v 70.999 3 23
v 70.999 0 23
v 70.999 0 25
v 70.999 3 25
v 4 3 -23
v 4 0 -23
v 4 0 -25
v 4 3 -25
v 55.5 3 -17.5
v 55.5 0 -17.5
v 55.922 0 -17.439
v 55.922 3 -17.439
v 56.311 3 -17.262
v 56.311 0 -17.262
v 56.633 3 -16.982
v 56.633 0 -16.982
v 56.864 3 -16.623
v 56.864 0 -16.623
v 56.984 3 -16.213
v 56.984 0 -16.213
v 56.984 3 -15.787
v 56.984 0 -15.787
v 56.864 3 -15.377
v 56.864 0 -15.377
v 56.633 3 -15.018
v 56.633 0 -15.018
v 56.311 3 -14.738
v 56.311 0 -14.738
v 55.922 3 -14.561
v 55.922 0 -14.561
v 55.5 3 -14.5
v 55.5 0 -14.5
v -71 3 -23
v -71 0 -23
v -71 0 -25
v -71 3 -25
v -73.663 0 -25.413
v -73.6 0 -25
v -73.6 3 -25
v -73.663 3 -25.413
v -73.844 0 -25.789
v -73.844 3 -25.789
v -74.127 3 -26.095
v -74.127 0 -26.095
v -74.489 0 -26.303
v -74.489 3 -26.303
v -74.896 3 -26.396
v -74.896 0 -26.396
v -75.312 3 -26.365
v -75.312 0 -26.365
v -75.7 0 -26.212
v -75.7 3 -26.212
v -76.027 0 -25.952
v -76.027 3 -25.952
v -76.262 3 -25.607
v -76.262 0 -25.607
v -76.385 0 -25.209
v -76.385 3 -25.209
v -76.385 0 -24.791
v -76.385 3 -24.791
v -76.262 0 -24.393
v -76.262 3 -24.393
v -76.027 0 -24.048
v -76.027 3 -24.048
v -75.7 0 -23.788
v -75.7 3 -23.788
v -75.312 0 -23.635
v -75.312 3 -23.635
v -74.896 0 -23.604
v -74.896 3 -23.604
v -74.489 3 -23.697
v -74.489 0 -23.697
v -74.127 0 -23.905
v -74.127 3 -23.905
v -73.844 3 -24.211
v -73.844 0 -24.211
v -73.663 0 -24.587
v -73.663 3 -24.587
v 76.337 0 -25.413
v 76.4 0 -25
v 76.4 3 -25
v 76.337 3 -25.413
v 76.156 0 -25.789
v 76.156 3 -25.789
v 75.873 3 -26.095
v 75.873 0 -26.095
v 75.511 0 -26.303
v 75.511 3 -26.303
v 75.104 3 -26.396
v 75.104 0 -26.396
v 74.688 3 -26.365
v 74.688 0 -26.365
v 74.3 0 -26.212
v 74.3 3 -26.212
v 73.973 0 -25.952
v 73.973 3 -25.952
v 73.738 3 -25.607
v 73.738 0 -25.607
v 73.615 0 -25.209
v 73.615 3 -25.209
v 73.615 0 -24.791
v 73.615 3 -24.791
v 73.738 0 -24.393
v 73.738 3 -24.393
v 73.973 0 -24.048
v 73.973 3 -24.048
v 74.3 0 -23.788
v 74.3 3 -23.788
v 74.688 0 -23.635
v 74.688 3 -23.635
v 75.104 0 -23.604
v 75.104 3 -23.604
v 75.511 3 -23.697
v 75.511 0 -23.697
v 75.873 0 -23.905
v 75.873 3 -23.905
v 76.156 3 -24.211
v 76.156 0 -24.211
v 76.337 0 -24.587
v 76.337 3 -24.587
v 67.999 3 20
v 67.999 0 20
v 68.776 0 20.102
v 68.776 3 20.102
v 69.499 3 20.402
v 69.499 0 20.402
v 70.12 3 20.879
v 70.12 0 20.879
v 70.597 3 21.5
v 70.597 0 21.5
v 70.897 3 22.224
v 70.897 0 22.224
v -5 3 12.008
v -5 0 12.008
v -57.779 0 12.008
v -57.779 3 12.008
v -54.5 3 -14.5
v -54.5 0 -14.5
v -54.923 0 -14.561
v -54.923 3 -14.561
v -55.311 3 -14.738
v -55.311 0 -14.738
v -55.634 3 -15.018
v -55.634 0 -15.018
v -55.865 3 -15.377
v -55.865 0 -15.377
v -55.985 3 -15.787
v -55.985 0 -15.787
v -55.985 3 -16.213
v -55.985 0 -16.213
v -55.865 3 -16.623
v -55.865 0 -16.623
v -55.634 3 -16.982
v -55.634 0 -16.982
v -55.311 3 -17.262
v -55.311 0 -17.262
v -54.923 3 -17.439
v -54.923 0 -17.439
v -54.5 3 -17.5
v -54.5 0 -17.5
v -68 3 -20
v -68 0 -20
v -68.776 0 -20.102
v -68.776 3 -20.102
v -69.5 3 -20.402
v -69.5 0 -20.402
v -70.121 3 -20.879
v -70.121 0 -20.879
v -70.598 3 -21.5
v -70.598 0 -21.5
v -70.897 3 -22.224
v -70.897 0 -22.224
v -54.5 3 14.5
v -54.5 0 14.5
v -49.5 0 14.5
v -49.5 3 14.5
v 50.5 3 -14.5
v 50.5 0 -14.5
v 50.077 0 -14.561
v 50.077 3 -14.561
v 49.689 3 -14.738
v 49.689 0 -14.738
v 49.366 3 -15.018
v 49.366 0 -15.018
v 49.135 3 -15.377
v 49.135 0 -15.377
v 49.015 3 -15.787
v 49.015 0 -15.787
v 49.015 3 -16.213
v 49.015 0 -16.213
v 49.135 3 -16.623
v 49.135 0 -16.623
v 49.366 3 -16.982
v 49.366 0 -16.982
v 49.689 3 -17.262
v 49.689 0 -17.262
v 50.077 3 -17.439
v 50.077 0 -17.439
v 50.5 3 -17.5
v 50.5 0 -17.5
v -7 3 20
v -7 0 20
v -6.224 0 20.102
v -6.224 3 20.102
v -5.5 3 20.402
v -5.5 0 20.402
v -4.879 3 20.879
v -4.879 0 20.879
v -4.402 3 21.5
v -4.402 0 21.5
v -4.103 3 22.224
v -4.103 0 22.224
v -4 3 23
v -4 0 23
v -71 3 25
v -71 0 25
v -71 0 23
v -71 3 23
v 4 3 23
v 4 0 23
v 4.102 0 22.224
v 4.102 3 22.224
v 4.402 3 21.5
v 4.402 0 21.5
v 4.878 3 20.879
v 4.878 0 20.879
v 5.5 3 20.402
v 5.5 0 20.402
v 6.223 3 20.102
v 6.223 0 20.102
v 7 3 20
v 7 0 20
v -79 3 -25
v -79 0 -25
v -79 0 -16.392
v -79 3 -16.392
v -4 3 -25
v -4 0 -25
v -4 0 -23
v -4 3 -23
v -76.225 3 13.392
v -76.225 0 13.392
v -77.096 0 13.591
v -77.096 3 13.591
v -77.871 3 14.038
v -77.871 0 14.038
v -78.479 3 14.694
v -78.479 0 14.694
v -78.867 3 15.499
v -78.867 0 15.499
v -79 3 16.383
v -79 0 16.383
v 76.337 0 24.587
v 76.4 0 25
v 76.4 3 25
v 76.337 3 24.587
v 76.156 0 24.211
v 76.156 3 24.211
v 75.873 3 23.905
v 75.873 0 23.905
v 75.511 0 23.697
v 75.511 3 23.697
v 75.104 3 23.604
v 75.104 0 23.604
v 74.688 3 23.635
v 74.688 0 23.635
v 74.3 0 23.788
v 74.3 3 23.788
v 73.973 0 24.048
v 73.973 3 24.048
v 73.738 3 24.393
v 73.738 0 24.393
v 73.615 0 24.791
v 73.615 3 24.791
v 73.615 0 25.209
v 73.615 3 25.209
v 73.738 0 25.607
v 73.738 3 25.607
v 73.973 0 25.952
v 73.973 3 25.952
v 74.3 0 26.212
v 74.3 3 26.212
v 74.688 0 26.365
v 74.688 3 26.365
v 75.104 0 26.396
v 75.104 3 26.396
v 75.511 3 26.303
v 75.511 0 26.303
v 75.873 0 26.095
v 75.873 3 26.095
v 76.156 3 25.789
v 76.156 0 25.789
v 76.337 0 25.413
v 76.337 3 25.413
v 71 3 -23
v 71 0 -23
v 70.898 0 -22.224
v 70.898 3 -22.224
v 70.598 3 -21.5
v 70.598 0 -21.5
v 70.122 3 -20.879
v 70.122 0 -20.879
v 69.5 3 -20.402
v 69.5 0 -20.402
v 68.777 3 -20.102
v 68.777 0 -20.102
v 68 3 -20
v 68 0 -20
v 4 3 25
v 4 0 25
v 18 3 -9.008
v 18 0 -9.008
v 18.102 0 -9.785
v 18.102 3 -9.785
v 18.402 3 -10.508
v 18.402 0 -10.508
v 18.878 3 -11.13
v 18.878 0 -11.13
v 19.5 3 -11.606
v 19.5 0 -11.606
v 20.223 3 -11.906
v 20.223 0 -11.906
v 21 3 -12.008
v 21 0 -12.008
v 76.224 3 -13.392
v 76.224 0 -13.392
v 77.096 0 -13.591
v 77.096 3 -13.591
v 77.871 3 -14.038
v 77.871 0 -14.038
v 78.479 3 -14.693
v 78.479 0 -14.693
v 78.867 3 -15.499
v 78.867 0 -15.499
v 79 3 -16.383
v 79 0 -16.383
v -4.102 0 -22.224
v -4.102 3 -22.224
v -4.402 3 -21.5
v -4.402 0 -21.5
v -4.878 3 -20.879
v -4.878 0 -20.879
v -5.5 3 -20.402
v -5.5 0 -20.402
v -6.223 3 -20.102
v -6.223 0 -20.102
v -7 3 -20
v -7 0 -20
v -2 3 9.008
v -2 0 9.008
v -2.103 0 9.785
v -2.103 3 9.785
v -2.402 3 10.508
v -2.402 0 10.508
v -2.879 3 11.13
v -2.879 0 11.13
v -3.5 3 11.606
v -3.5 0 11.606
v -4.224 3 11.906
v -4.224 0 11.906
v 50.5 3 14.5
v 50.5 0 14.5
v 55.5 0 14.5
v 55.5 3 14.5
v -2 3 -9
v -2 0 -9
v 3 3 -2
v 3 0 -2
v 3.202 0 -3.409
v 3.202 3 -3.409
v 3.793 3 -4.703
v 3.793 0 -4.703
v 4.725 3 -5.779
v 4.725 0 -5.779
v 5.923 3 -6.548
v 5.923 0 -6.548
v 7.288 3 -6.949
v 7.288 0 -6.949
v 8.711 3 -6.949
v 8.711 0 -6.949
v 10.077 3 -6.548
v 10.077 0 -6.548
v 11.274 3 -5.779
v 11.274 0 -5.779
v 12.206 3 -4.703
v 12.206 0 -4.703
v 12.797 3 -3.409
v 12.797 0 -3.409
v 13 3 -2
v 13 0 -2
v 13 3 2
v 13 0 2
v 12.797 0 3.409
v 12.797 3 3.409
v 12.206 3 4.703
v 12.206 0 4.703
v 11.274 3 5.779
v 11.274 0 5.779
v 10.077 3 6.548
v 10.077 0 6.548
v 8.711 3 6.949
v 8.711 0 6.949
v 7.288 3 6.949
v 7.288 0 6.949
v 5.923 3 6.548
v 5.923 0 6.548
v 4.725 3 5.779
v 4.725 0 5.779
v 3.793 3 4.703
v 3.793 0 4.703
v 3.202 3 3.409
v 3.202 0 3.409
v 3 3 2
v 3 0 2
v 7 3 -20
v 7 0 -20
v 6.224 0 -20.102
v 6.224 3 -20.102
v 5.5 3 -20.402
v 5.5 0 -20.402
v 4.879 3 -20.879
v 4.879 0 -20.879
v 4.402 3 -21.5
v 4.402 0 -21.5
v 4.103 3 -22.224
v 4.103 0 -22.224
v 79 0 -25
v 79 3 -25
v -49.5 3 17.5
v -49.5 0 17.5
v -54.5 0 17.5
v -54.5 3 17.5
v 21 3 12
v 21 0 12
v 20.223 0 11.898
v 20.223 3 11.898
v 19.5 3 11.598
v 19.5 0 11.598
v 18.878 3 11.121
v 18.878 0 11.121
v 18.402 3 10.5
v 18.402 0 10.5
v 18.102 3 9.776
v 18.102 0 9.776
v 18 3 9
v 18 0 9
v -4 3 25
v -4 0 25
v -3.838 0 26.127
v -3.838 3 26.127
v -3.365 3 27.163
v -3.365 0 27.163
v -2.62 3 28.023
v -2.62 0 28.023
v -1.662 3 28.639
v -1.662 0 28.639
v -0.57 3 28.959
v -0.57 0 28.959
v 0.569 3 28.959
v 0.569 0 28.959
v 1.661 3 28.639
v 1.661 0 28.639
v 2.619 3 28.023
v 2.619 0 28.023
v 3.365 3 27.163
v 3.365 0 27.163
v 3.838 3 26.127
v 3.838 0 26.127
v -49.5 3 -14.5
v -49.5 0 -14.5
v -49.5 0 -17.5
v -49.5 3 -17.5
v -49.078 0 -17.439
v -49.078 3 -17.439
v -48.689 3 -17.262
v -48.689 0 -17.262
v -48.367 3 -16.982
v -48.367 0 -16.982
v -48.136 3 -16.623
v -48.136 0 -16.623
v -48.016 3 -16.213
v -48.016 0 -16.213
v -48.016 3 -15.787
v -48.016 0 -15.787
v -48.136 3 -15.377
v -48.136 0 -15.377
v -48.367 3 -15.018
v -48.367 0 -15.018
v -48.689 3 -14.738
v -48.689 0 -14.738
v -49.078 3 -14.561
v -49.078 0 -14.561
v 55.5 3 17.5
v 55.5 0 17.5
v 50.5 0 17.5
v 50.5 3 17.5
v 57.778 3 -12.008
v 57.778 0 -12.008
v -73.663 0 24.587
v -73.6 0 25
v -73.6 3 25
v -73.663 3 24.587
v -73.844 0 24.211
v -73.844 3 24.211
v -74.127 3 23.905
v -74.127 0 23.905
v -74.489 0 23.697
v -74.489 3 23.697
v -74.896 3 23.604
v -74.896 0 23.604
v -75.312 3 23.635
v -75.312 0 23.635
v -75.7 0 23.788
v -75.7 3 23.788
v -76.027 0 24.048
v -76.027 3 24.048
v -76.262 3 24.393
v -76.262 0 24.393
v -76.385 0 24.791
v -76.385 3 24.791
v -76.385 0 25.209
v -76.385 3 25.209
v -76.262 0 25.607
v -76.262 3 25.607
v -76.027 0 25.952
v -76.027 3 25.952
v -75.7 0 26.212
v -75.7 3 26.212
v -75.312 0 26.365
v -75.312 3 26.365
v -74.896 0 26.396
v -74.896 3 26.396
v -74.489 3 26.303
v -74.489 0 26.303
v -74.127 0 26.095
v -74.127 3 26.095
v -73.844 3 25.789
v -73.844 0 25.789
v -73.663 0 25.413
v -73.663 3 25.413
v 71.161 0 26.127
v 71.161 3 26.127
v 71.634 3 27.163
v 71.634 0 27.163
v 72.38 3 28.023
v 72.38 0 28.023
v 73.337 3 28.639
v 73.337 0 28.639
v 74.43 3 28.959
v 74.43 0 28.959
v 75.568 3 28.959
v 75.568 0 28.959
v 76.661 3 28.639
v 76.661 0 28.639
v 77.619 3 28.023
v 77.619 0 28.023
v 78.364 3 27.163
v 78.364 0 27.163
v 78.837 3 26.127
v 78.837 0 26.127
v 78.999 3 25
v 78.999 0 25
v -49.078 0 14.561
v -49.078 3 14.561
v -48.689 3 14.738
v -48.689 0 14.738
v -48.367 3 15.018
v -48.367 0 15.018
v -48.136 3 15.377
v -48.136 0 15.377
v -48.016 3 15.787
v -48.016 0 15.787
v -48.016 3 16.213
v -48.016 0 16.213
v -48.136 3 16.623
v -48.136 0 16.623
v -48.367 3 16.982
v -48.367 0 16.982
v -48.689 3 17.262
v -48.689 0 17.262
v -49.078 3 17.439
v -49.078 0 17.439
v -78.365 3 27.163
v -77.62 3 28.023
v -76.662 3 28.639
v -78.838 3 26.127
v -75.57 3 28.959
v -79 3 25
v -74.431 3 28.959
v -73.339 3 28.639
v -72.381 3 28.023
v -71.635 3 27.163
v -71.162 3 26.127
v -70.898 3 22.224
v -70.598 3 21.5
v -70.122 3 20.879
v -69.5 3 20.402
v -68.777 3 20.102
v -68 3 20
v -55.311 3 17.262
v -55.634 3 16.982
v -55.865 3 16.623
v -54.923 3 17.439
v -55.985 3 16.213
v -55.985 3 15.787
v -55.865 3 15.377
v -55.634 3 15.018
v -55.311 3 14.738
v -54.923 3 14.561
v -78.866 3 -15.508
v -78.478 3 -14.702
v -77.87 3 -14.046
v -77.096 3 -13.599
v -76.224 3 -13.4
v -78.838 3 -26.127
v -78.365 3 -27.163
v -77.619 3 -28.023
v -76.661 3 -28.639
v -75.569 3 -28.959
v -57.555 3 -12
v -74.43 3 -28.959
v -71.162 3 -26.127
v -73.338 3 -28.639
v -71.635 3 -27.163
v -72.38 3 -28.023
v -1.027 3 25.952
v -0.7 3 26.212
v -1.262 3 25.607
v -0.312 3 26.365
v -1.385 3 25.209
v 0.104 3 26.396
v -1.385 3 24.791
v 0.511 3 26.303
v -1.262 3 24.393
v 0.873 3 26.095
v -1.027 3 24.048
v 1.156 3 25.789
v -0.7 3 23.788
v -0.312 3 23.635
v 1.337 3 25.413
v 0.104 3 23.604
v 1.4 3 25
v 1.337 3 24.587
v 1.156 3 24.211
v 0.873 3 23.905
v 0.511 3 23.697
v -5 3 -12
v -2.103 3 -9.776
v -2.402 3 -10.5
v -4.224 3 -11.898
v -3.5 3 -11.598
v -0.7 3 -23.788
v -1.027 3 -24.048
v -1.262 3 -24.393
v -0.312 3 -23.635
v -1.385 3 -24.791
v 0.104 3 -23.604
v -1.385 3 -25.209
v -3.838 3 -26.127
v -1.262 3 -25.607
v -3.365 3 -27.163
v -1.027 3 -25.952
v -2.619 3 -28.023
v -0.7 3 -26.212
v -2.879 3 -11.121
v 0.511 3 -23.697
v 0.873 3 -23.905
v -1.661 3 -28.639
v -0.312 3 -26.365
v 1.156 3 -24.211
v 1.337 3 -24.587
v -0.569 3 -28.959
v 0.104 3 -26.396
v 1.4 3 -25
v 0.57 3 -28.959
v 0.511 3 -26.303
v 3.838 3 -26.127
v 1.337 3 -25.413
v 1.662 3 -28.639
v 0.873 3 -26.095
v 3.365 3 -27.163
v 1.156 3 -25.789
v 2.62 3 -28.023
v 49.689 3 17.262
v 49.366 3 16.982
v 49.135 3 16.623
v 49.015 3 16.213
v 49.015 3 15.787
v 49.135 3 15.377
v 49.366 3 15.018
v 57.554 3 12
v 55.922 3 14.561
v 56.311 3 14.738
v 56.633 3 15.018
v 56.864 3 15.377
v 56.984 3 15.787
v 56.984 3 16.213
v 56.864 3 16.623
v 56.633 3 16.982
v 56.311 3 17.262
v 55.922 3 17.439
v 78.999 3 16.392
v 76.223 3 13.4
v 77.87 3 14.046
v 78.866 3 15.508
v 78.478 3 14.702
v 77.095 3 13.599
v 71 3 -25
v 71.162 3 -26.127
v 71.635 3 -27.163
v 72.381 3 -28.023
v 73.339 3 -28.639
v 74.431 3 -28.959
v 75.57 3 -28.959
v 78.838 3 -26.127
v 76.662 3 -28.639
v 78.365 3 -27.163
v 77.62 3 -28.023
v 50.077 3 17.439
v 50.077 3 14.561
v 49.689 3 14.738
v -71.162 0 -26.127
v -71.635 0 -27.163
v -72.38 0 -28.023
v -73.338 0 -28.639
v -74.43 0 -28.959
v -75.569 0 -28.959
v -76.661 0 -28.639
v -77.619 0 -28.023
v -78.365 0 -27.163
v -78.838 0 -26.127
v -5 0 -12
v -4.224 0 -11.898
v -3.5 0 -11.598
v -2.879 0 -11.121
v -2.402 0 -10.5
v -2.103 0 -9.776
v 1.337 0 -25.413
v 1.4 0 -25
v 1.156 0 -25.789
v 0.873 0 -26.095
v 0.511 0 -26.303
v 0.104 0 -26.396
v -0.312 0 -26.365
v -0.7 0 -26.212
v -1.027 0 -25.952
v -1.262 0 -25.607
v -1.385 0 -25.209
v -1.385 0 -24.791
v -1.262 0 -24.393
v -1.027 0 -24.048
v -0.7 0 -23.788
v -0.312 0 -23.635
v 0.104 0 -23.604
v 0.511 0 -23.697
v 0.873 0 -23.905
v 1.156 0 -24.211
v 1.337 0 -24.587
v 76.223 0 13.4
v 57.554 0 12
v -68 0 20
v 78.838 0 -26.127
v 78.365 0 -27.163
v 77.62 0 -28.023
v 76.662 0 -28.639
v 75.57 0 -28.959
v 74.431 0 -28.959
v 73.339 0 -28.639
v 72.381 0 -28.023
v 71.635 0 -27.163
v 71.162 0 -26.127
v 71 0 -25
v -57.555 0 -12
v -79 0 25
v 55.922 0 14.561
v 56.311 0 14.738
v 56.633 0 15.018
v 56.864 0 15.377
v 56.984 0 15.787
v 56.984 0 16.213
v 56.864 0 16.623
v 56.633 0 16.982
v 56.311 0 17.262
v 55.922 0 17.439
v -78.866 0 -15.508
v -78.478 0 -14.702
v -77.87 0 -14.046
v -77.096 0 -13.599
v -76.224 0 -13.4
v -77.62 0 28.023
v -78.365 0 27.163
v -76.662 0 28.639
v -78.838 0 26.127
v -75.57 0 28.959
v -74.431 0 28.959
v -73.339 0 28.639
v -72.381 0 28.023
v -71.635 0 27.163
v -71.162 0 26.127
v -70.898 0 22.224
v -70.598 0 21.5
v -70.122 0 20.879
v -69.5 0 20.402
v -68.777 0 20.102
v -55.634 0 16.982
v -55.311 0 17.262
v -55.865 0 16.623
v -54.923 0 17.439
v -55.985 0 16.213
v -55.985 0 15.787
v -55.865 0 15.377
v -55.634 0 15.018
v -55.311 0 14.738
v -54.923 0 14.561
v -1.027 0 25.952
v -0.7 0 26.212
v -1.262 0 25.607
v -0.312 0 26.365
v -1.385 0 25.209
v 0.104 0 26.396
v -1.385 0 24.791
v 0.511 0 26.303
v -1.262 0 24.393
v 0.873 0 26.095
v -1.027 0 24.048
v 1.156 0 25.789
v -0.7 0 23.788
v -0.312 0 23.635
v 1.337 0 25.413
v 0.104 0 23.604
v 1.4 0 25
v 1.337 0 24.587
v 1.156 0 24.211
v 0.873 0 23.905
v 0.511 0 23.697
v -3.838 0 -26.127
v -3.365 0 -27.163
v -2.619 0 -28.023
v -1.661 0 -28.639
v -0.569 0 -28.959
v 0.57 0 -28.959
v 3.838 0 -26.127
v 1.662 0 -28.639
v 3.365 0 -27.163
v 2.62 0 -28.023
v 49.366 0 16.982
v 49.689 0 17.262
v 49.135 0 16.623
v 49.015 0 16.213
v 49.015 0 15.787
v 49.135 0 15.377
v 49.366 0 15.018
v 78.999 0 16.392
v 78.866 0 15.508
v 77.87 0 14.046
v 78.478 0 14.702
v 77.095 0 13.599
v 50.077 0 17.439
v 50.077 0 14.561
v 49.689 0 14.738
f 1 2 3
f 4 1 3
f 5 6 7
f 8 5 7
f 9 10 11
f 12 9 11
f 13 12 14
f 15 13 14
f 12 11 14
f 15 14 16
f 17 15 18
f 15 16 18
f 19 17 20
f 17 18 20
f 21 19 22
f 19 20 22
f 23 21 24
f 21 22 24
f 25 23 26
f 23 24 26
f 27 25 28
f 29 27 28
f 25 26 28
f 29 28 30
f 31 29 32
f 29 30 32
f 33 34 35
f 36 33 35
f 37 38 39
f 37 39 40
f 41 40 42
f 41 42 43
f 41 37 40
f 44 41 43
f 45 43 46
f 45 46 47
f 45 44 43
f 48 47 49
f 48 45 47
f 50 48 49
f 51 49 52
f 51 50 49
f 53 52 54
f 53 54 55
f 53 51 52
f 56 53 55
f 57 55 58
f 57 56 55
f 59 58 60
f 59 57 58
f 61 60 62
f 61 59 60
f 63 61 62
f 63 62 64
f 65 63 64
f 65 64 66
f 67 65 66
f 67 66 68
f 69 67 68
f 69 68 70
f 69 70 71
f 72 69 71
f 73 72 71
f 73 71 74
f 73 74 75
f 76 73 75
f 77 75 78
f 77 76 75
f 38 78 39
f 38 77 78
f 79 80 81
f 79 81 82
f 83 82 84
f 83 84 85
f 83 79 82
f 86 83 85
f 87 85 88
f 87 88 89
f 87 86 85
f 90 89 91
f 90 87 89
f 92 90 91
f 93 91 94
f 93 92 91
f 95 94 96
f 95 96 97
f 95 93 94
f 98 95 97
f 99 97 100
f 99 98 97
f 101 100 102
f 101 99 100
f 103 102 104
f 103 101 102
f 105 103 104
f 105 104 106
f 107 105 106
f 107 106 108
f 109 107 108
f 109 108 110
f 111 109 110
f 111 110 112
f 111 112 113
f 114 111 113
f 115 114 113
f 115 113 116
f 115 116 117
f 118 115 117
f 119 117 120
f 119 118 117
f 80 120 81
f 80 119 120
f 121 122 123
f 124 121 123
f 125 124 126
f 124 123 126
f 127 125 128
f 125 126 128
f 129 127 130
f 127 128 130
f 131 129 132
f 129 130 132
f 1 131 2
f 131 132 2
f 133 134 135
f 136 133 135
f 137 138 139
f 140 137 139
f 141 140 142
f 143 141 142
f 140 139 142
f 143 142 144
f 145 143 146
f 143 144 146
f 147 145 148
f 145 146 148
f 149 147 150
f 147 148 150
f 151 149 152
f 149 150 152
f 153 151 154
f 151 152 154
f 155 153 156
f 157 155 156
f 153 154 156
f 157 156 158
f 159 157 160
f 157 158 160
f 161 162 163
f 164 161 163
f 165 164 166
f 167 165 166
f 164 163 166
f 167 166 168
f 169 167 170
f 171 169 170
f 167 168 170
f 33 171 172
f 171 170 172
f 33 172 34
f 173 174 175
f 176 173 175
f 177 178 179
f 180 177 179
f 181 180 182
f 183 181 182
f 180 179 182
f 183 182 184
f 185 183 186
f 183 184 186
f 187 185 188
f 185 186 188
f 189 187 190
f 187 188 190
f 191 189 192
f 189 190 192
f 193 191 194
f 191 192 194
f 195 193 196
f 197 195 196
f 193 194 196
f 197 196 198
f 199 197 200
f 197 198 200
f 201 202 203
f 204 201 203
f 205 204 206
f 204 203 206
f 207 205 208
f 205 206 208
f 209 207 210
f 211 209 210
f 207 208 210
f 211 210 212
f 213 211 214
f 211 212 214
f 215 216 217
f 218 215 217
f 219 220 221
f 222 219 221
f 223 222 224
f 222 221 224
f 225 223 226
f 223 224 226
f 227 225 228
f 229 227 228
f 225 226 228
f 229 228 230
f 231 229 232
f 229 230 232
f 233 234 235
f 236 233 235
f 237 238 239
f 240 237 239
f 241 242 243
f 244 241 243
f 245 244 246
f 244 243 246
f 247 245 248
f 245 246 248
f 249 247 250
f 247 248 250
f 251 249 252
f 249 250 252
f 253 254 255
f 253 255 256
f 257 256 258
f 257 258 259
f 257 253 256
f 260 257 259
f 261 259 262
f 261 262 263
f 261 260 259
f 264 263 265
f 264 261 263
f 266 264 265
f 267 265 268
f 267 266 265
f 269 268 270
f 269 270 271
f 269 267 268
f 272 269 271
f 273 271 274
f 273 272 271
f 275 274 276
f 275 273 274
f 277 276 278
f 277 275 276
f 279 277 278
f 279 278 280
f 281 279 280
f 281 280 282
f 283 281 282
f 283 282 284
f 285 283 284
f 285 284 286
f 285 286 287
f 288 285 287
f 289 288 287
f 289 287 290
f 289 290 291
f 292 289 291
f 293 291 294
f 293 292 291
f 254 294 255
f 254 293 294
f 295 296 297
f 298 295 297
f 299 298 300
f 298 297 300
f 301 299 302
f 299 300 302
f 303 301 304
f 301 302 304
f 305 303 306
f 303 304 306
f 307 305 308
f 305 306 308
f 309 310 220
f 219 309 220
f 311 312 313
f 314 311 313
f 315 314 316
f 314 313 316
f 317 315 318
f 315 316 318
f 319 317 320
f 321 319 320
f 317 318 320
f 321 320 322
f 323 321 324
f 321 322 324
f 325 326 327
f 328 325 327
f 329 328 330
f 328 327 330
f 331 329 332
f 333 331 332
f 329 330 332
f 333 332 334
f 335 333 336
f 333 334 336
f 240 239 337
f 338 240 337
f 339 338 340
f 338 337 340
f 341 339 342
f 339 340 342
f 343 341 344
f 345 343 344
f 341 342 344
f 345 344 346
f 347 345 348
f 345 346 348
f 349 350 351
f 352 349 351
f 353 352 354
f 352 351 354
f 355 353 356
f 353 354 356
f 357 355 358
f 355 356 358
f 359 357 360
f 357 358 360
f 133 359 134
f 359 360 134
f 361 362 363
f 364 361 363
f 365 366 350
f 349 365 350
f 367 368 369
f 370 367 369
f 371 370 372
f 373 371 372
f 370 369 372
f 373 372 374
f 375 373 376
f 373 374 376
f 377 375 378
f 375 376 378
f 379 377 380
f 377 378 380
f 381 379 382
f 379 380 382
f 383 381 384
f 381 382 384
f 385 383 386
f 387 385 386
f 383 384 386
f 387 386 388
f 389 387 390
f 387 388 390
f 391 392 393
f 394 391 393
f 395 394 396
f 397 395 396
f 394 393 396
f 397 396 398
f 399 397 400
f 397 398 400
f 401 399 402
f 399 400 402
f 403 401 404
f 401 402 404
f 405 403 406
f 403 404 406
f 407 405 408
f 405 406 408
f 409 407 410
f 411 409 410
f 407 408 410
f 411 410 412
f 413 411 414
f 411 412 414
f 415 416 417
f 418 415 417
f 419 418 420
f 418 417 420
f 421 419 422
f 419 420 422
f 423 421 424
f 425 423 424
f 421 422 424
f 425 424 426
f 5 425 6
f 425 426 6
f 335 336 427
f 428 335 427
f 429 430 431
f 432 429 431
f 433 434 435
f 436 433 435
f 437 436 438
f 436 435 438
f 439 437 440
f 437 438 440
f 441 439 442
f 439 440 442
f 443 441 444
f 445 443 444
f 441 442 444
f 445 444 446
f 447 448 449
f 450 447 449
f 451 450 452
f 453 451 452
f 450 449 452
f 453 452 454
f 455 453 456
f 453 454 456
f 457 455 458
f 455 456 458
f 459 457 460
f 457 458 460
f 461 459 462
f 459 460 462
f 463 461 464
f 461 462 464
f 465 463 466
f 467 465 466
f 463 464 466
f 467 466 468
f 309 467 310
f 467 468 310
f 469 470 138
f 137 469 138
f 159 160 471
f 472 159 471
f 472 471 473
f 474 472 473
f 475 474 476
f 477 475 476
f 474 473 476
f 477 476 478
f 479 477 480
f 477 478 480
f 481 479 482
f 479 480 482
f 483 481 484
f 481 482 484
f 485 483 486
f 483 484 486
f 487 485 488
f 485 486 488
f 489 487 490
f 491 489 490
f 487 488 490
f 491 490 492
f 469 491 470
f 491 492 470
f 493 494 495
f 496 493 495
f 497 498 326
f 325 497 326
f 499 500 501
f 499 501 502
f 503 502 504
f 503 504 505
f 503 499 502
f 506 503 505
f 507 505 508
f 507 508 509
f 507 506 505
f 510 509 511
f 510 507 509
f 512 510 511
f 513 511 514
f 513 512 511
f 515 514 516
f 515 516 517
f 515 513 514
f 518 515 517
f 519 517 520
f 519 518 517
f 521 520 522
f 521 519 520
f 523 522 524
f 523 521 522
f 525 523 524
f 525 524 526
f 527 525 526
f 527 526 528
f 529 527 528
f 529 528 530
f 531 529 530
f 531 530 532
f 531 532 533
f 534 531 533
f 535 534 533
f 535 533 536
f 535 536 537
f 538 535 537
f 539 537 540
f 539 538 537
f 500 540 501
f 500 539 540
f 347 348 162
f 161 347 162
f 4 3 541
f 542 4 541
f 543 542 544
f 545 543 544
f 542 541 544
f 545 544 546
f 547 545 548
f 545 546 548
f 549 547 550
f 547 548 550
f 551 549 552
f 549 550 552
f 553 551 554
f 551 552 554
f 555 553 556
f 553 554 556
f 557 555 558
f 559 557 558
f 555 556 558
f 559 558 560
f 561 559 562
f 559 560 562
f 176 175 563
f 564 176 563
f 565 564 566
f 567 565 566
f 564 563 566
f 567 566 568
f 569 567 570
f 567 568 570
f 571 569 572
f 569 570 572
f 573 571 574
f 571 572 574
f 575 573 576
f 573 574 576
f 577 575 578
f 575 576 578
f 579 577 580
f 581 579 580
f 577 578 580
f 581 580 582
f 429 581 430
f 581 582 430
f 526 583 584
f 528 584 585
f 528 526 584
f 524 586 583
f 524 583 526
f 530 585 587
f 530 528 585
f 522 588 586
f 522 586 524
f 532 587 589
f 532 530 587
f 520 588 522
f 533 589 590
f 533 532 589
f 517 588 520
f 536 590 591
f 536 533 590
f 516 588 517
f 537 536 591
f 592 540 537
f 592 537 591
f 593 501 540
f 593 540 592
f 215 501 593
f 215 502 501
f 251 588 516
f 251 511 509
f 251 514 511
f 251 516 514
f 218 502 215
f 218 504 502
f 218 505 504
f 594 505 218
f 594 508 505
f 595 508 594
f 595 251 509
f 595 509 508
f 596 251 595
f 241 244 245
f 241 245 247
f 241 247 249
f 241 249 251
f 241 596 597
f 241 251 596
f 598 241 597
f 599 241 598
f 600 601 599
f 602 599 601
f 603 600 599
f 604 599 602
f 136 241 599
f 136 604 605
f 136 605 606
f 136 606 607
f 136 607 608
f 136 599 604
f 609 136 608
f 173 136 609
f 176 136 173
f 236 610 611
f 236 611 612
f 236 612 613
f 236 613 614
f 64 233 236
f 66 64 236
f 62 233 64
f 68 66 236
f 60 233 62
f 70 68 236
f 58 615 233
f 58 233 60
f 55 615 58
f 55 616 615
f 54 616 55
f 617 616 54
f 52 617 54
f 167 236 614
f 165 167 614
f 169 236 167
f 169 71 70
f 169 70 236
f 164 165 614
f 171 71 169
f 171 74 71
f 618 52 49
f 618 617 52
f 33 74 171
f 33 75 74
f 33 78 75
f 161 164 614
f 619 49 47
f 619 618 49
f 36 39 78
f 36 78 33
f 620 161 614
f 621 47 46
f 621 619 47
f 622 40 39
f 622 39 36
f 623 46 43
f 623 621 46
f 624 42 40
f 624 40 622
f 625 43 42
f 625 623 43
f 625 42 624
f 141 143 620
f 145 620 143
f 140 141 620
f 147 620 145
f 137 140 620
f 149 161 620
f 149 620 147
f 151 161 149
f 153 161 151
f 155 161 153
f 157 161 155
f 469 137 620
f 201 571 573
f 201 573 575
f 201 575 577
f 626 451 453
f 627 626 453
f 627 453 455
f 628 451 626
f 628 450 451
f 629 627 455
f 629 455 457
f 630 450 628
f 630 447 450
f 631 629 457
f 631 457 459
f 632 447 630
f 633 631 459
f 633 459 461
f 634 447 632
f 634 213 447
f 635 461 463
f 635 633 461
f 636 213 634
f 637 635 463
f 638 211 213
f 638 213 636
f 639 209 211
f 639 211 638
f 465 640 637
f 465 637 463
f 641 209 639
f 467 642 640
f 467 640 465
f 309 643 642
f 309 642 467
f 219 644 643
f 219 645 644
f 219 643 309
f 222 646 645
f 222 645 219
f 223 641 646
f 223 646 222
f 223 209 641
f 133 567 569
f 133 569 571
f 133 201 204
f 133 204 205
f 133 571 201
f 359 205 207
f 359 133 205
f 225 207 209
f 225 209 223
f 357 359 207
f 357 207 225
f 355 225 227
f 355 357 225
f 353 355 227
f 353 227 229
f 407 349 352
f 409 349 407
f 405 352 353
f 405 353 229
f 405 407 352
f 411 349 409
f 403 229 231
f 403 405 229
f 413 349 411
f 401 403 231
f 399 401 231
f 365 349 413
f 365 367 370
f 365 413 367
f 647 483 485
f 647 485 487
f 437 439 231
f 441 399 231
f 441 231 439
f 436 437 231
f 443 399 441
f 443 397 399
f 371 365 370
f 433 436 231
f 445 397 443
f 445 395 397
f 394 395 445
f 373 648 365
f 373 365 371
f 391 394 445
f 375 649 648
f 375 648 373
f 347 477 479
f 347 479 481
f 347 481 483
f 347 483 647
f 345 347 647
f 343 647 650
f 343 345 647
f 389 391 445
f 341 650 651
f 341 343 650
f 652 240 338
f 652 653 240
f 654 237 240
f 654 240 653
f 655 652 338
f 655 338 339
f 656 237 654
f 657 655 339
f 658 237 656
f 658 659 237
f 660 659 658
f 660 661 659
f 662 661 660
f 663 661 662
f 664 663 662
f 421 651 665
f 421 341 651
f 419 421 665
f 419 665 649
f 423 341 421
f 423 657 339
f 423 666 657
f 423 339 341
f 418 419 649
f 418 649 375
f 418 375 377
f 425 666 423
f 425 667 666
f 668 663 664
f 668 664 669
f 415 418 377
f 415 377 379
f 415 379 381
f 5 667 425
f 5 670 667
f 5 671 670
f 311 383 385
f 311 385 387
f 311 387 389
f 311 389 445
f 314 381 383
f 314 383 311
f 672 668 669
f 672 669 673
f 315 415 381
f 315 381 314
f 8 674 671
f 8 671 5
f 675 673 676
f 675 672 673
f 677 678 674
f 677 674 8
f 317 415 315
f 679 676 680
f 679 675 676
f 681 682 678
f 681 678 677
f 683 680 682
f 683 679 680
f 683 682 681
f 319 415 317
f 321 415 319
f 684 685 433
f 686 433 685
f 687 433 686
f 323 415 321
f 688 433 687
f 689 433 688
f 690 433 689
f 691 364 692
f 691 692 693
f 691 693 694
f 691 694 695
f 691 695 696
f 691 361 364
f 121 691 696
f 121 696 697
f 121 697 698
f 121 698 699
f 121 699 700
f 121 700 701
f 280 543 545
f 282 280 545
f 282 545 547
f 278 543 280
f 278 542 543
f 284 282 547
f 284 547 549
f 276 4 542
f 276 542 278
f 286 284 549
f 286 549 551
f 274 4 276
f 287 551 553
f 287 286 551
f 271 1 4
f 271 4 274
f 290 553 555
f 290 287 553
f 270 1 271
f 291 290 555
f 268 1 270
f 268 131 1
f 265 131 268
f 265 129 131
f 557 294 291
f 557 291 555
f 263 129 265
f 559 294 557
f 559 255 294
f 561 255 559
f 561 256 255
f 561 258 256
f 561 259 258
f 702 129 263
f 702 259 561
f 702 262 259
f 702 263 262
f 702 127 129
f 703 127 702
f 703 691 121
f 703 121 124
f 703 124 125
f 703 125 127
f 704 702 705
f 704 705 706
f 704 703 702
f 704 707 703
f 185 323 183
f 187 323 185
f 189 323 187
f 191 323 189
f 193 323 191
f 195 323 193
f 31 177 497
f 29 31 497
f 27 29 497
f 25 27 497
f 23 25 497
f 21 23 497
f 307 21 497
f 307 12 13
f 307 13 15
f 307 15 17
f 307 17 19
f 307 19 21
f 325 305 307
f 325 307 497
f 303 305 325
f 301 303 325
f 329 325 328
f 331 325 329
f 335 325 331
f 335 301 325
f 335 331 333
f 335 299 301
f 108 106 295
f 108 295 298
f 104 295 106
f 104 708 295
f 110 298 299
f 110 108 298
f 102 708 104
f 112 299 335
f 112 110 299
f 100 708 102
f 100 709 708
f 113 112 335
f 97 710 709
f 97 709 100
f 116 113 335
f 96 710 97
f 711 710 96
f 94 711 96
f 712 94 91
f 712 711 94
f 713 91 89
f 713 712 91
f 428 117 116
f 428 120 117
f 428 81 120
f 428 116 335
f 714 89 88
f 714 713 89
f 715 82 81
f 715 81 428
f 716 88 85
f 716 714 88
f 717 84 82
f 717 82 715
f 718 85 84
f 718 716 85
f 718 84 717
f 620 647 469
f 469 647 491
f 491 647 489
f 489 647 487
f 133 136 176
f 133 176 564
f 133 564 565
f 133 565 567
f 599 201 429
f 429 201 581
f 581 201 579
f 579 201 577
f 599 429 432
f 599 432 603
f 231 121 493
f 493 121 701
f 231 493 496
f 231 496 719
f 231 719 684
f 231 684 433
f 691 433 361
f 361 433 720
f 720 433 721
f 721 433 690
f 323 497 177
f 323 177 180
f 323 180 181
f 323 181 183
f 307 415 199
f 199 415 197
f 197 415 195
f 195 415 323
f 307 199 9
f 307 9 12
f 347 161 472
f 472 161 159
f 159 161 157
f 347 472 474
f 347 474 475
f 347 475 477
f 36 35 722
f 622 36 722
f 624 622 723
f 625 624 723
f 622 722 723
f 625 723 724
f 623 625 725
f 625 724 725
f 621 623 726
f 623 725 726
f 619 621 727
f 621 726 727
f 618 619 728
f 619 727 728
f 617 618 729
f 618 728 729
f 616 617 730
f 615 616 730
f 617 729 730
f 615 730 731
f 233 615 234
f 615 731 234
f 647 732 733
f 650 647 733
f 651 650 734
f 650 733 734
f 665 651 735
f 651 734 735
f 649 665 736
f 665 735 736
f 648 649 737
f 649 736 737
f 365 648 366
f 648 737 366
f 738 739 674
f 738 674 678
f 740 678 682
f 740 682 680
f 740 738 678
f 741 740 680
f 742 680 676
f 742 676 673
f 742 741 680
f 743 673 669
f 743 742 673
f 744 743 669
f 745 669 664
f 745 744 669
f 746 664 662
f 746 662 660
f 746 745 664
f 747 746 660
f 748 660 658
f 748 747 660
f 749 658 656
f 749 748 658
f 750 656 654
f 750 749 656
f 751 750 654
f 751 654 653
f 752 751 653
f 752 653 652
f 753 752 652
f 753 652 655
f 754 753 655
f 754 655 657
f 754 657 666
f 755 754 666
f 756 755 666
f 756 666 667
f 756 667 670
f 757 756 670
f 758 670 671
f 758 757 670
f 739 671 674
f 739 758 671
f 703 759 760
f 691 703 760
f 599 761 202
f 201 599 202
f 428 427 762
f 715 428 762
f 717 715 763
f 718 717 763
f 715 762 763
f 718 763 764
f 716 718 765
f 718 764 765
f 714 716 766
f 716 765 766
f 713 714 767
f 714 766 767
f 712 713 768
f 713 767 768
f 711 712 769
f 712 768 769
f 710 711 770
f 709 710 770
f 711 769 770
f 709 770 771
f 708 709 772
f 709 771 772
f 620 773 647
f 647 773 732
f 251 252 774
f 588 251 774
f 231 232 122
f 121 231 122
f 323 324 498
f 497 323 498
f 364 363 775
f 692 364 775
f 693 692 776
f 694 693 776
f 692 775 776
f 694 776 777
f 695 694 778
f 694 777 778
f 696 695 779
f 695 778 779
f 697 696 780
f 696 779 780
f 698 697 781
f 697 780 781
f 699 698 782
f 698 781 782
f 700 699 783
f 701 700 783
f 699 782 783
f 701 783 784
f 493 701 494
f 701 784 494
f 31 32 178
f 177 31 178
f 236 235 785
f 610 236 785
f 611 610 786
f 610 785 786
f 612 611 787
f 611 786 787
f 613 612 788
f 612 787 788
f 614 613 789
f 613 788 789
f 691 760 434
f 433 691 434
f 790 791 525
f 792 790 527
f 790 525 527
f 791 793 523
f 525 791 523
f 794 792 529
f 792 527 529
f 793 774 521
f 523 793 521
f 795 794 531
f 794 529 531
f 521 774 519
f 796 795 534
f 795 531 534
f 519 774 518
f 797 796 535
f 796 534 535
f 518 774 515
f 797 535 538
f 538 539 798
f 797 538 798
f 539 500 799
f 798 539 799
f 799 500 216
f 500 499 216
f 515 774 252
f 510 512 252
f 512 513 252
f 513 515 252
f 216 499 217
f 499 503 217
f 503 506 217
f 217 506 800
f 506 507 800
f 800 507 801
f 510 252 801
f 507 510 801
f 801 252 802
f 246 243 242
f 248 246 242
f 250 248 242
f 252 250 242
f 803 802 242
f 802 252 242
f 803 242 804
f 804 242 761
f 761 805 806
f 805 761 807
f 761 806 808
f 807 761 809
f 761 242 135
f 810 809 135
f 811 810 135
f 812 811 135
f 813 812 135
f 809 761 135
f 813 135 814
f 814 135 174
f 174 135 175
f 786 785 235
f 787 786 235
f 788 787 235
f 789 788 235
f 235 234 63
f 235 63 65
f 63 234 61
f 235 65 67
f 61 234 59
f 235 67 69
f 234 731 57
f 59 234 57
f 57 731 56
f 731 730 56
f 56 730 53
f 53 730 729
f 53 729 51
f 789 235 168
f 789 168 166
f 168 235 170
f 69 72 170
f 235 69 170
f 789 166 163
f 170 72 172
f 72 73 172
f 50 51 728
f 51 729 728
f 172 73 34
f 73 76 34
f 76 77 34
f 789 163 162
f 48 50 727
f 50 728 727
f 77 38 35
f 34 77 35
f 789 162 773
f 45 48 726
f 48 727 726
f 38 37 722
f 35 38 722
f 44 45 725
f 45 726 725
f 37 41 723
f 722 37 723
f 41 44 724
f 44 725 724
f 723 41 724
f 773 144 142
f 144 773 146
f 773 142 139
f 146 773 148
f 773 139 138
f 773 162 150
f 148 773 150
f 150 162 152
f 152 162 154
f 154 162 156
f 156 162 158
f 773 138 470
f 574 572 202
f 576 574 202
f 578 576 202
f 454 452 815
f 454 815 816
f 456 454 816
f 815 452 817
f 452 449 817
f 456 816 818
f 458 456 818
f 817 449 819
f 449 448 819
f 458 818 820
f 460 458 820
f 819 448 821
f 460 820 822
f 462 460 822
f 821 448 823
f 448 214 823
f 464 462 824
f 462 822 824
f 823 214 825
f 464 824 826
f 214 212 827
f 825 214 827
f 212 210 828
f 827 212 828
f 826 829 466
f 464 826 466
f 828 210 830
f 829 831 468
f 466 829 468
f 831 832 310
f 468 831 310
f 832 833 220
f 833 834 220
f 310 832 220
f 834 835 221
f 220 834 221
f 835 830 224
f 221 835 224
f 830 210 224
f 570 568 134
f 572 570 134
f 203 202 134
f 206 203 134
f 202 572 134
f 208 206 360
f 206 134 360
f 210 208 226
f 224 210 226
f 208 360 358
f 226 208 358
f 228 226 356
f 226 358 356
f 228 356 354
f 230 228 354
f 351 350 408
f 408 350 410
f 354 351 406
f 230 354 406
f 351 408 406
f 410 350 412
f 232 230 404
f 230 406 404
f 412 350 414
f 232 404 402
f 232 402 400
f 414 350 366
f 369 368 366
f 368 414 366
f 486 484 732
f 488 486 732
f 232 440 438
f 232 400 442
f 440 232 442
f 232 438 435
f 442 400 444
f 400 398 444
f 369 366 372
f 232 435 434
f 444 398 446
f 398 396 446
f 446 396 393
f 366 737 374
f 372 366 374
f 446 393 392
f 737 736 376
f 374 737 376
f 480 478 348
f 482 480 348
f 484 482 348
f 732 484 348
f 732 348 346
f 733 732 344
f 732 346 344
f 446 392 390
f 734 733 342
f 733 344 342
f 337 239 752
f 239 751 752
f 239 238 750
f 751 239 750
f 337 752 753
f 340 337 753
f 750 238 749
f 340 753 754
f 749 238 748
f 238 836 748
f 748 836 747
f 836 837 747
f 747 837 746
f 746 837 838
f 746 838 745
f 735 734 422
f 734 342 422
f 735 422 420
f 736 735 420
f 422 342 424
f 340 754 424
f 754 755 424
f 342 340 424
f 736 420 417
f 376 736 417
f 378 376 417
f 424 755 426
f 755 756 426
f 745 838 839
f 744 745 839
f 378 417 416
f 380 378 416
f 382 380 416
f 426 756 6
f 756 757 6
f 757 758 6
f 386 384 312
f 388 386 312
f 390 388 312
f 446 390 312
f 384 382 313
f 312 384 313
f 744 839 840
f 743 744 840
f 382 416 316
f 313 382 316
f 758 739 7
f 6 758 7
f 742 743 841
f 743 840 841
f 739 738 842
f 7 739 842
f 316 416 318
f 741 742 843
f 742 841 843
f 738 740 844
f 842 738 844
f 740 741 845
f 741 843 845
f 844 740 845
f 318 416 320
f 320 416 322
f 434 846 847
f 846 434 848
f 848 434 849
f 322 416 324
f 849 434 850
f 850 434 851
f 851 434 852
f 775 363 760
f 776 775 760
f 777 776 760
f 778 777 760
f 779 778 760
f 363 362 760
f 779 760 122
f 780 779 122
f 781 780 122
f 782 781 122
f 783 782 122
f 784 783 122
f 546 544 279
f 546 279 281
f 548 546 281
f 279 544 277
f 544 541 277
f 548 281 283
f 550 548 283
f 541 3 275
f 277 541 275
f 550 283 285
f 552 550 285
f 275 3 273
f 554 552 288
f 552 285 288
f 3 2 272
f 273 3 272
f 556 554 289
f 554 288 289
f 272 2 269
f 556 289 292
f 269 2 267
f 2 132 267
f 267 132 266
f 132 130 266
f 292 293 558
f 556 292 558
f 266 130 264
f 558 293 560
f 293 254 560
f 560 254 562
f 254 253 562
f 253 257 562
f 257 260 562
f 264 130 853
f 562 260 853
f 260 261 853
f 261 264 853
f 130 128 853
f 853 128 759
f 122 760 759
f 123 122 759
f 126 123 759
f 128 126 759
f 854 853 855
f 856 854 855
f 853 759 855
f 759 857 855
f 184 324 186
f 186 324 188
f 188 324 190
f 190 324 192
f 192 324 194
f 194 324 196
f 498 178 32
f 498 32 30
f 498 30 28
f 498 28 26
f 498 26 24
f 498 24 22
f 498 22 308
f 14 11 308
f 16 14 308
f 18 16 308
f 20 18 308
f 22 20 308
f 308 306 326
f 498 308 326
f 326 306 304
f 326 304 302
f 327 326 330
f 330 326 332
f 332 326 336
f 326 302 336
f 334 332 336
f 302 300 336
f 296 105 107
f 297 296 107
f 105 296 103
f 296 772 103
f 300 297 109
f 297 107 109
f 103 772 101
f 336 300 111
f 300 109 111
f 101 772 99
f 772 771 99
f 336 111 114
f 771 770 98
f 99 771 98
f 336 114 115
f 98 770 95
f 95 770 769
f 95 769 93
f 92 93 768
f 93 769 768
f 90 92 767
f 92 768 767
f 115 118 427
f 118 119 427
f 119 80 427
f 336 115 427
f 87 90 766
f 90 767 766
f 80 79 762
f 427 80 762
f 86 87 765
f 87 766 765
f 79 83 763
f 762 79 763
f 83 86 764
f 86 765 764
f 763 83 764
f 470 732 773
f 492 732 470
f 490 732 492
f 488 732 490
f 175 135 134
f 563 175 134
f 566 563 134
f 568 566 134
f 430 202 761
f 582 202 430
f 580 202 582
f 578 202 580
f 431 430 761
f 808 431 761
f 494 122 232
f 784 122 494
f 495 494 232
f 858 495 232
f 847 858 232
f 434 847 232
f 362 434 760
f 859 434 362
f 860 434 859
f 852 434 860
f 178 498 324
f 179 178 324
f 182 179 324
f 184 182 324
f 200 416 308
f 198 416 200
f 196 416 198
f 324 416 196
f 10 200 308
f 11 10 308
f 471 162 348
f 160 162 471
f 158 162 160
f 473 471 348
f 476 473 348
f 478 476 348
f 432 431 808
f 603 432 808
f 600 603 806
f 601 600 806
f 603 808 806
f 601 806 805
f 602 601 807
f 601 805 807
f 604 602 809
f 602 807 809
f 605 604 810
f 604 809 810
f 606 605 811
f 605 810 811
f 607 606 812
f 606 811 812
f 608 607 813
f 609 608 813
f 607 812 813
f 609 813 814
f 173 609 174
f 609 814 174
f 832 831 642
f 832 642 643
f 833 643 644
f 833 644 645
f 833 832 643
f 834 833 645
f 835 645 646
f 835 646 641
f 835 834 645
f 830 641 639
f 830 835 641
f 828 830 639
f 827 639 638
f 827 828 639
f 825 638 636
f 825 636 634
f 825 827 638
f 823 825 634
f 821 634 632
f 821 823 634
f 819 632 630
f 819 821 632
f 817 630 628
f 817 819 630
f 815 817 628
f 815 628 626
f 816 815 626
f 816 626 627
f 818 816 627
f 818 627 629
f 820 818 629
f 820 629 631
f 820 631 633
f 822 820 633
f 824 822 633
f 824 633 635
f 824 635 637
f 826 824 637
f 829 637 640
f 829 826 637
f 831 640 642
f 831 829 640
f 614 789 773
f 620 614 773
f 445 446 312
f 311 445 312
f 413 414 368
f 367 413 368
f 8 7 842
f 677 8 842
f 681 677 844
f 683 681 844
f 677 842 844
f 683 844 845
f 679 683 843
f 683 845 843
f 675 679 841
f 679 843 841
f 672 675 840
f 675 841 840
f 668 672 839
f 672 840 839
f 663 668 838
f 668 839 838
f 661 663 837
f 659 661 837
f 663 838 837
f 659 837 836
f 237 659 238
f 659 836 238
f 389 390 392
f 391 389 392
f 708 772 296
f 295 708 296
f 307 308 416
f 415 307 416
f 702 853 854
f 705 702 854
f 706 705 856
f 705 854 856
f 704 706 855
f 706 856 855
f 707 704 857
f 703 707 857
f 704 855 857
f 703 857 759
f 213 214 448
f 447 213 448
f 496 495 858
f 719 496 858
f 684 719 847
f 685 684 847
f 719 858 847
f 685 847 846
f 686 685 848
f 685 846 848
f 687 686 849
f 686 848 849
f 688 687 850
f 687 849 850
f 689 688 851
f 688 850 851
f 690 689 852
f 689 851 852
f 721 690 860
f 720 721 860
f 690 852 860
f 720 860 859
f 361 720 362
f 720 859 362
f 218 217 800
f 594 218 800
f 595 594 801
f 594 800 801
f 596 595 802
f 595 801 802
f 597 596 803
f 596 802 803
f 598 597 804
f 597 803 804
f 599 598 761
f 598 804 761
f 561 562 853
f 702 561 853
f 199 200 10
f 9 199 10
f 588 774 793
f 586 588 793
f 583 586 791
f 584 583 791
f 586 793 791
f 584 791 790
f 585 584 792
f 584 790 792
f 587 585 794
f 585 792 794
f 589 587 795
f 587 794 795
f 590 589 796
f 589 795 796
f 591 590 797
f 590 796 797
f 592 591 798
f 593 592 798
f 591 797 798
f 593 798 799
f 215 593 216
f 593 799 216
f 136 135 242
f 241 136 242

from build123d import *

# Parameters (mm, degrees)
SKETCH1_R           = 1.4
BOSS_EXTRUDE1_DEPTH = 3


with BuildPart() as part:
    # Sketch1 → Boss-Extrude1 (new body)
    with BuildSketch(Plane(origin=(0, 0, 0), x_dir=(1, 0, 0), z_dir=(0, 1, 0))):
        with BuildLine():
            Line((-76.22405565, 13.400206277), (-57.554638622, 12))
            Line((-57.554638622, 12), (-5.000314195, 12))
            ThreePointArc((-5.000314195, 12), (-2.878993852, 11.121320344), (-2.000314195, 9))
            Line((-2.000314195, 9), (-2.000314195, -9.00840207))
            ThreePointArc((-2.000314195, -9.00840207), (-2.878993852, -11.129722414), (-5.000314195, -12.00840207))
            Line((-5.000314195, -12.00840207), (-57.779008466, -12.00840207))
            Line((-57.779008466, -12.00840207), (-76.22468404, -13.391827738))
            ThreePointArc((-76.22468404, -13.391827738), (-78.199531048, -14.342973455), (-79.000314195, -16.383425668))
            Line((-79.000314195, -16.383425668), (-79.000314195, -25))
            ThreePointArc((-79.000314195, -25), (-75.000314195, -29), (-71.000314195, -25))
            Line((-71.000314195, -25), (-71.000314195, -23))
            ThreePointArc((-71.000314195, -23), (-70.121634539, -20.878679656), (-68.000314195, -20))
            Line((-68.000314195, -20), (-7.000314195, -20))
            ThreePointArc((-7.000314195, -20), (-4.878993852, -20.878679656), (-4.000314195, -23))
            Line((-4.000314195, -23), (-4.000314195, -25))
            ThreePointArc((-4.000314195, -25), (-0.000314195, -29), (3.999685805, -25))
            Line((3.999685805, -25), (3.999685805, -23))
            ThreePointArc((3.999685805, -23), (4.878365461, -20.878679656), (6.999685805, -20))
            Line((6.999685805, -20), (67.999057414, -20))
            ThreePointArc((67.999057414, -20), (70.120377758, -20.878679656), (70.999057414, -23))
            Line((70.999057414, -23), (70.999057414, -25))
            ThreePointArc((70.999057414, -25), (74.999057414, -29), (78.999057414, -25))
            Line((78.999057414, -25), (78.999057414, -16.391804207))
            ThreePointArc((78.999057414, -16.391804207), (78.198274268, -14.351351994), (76.223427259, -13.400206277))
            Line((76.223427259, -13.400206277), (57.554010231, -12))
            Line((57.554010231, -12), (20.999685805, -12))
            ThreePointArc((20.999685805, -12), (18.878365461, -11.121320344), (17.999685805, -9))
            Line((17.999685805, -9), (17.999685805, 9.00840207))
            ThreePointArc((17.999685805, 9.00840207), (18.878365461, 11.129722414), (20.999685805, 12.00840207))
            Line((20.999685805, 12.00840207), (57.778380076, 12.00840207))
            Line((57.778380076, 12.00840207), (76.22405565, 13.391827738))
            ThreePointArc((76.22405565, 13.391827738), (78.199300731, 14.342772308), (79.000314195, 16.383425668))
            Line((79.000314195, 16.383425668), (79.000314195, 25))
            ThreePointArc((79.000314195, 25), (75.000314195, 29), (71.000314195, 25))
            Line((71.000314195, 25), (71.000314195, 23))
            ThreePointArc((71.000314195, 23), (70.121634539, 20.878679656), (68.000314195, 20))
            Line((68.000314195, 20), (7.000314195, 20))
            ThreePointArc((7.000314195, 20), (4.878993852, 20.878679656), (4.000314195, 23))
            Line((4.000314195, 23), (4.000314195, 25))
            ThreePointArc((4.000314195, 25), (0.000314195, 29), (-3.999685805, 25))
            Line((-3.999685805, 25), (-3.999685805, 23))
            ThreePointArc((-3.999685805, 23), (-4.878365461, 20.878679656), (-6.999685805, 20))
            Line((-6.999685805, 20), (-67.999685805, 20))
            ThreePointArc((-67.999685805, 20), (-70.121006148, 20.878679656), (-70.999685805, 23))
            Line((-70.999685805, 23), (-70.999685805, 25))
            ThreePointArc((-70.999685805, 25), (-74.999685805, 29), (-78.999685805, 25))
            Line((-78.999685805, 25), (-78.999685805, 16.391804207))
            ThreePointArc((-78.999685805, 16.391804207), (-78.198902658, 14.351351994), (-76.22405565, 13.400206277))
        make_face()
        with Locations((74.999685805, 25)):
            Circle(SKETCH1_R, mode=Mode.SUBTRACT)
        with Locations((74.999685805, -25)):
            Circle(SKETCH1_R, mode=Mode.SUBTRACT)
        with Locations((-0.000314195, -25)):
            Circle(SKETCH1_R, mode=Mode.SUBTRACT)
        with Locations((-0.000314195, 25)):
            Circle(SKETCH1_R, mode=Mode.SUBTRACT)
        with Locations((-75.000314195, 25)):
            Circle(SKETCH1_R, mode=Mode.SUBTRACT)
        with Locations((-75.000314195, -25)):
            Circle(SKETCH1_R, mode=Mode.SUBTRACT)
        with BuildLine():
            Line((55.499685805, -17.5), (50.499685805, -17.5))
            ThreePointArc((50.499685805, -17.5), (48.999685805, -16), (50.499685805, -14.5))
            Line((50.499685805, -14.5), (55.499685805, -14.5))
            ThreePointArc((55.499685805, -14.5), (56.999685805, -16), (55.499685805, -17.5))
        make_face(mode=Mode.SUBTRACT)
        with BuildLine():
            Line((50.499685805, 17.5), (55.499685805, 17.5))
            ThreePointArc((55.499685805, 17.5), (56.999685805, 16), (55.499685805, 14.5))
            Line((55.499685805, 14.5), (50.499685805, 14.5))
            ThreePointArc((50.499685805, 14.5), (48.999685805, 16), (50.499685805, 17.5))
        make_face(mode=Mode.SUBTRACT)
        with BuildLine():
            Line((12.999685805, 2), (12.999685805, -2))
            ThreePointArc((12.999685805, -2), (7.999685805, -7), (2.999685805, -2))
            Line((2.999685805, -2), (2.999685805, 2))
            ThreePointArc((2.999685805, 2), (7.999685805, 7), (12.999685805, 2))
        make_face(mode=Mode.SUBTRACT)
        with BuildLine():
            Line((-49.500314195, -17.5), (-54.500314195, -17.5))
            ThreePointArc((-54.500314195, -17.5), (-56.000314195, -16), (-54.500314195, -14.5))
            Line((-54.500314195, -14.5), (-49.500314195, -14.5))
            ThreePointArc((-49.500314195, -14.5), (-48.000314195, -16), (-49.500314195, -17.5))
        make_face(mode=Mode.SUBTRACT)
        with BuildLine():
            Line((-54.500314195, 17.5), (-49.500314195, 17.5))
            ThreePointArc((-49.500314195, 17.5), (-48.000314195, 16), (-49.500314195, 14.5))
            Line((-49.500314195, 14.5), (-54.500314195, 14.5))
            ThreePointArc((-54.500314195, 14.5), (-56.000314195, 16), (-54.500314195, 17.5))
        make_face(mode=Mode.SUBTRACT)
    extrude(amount=BOSS_EXTRUDE1_DEPTH)


solid = part.part
